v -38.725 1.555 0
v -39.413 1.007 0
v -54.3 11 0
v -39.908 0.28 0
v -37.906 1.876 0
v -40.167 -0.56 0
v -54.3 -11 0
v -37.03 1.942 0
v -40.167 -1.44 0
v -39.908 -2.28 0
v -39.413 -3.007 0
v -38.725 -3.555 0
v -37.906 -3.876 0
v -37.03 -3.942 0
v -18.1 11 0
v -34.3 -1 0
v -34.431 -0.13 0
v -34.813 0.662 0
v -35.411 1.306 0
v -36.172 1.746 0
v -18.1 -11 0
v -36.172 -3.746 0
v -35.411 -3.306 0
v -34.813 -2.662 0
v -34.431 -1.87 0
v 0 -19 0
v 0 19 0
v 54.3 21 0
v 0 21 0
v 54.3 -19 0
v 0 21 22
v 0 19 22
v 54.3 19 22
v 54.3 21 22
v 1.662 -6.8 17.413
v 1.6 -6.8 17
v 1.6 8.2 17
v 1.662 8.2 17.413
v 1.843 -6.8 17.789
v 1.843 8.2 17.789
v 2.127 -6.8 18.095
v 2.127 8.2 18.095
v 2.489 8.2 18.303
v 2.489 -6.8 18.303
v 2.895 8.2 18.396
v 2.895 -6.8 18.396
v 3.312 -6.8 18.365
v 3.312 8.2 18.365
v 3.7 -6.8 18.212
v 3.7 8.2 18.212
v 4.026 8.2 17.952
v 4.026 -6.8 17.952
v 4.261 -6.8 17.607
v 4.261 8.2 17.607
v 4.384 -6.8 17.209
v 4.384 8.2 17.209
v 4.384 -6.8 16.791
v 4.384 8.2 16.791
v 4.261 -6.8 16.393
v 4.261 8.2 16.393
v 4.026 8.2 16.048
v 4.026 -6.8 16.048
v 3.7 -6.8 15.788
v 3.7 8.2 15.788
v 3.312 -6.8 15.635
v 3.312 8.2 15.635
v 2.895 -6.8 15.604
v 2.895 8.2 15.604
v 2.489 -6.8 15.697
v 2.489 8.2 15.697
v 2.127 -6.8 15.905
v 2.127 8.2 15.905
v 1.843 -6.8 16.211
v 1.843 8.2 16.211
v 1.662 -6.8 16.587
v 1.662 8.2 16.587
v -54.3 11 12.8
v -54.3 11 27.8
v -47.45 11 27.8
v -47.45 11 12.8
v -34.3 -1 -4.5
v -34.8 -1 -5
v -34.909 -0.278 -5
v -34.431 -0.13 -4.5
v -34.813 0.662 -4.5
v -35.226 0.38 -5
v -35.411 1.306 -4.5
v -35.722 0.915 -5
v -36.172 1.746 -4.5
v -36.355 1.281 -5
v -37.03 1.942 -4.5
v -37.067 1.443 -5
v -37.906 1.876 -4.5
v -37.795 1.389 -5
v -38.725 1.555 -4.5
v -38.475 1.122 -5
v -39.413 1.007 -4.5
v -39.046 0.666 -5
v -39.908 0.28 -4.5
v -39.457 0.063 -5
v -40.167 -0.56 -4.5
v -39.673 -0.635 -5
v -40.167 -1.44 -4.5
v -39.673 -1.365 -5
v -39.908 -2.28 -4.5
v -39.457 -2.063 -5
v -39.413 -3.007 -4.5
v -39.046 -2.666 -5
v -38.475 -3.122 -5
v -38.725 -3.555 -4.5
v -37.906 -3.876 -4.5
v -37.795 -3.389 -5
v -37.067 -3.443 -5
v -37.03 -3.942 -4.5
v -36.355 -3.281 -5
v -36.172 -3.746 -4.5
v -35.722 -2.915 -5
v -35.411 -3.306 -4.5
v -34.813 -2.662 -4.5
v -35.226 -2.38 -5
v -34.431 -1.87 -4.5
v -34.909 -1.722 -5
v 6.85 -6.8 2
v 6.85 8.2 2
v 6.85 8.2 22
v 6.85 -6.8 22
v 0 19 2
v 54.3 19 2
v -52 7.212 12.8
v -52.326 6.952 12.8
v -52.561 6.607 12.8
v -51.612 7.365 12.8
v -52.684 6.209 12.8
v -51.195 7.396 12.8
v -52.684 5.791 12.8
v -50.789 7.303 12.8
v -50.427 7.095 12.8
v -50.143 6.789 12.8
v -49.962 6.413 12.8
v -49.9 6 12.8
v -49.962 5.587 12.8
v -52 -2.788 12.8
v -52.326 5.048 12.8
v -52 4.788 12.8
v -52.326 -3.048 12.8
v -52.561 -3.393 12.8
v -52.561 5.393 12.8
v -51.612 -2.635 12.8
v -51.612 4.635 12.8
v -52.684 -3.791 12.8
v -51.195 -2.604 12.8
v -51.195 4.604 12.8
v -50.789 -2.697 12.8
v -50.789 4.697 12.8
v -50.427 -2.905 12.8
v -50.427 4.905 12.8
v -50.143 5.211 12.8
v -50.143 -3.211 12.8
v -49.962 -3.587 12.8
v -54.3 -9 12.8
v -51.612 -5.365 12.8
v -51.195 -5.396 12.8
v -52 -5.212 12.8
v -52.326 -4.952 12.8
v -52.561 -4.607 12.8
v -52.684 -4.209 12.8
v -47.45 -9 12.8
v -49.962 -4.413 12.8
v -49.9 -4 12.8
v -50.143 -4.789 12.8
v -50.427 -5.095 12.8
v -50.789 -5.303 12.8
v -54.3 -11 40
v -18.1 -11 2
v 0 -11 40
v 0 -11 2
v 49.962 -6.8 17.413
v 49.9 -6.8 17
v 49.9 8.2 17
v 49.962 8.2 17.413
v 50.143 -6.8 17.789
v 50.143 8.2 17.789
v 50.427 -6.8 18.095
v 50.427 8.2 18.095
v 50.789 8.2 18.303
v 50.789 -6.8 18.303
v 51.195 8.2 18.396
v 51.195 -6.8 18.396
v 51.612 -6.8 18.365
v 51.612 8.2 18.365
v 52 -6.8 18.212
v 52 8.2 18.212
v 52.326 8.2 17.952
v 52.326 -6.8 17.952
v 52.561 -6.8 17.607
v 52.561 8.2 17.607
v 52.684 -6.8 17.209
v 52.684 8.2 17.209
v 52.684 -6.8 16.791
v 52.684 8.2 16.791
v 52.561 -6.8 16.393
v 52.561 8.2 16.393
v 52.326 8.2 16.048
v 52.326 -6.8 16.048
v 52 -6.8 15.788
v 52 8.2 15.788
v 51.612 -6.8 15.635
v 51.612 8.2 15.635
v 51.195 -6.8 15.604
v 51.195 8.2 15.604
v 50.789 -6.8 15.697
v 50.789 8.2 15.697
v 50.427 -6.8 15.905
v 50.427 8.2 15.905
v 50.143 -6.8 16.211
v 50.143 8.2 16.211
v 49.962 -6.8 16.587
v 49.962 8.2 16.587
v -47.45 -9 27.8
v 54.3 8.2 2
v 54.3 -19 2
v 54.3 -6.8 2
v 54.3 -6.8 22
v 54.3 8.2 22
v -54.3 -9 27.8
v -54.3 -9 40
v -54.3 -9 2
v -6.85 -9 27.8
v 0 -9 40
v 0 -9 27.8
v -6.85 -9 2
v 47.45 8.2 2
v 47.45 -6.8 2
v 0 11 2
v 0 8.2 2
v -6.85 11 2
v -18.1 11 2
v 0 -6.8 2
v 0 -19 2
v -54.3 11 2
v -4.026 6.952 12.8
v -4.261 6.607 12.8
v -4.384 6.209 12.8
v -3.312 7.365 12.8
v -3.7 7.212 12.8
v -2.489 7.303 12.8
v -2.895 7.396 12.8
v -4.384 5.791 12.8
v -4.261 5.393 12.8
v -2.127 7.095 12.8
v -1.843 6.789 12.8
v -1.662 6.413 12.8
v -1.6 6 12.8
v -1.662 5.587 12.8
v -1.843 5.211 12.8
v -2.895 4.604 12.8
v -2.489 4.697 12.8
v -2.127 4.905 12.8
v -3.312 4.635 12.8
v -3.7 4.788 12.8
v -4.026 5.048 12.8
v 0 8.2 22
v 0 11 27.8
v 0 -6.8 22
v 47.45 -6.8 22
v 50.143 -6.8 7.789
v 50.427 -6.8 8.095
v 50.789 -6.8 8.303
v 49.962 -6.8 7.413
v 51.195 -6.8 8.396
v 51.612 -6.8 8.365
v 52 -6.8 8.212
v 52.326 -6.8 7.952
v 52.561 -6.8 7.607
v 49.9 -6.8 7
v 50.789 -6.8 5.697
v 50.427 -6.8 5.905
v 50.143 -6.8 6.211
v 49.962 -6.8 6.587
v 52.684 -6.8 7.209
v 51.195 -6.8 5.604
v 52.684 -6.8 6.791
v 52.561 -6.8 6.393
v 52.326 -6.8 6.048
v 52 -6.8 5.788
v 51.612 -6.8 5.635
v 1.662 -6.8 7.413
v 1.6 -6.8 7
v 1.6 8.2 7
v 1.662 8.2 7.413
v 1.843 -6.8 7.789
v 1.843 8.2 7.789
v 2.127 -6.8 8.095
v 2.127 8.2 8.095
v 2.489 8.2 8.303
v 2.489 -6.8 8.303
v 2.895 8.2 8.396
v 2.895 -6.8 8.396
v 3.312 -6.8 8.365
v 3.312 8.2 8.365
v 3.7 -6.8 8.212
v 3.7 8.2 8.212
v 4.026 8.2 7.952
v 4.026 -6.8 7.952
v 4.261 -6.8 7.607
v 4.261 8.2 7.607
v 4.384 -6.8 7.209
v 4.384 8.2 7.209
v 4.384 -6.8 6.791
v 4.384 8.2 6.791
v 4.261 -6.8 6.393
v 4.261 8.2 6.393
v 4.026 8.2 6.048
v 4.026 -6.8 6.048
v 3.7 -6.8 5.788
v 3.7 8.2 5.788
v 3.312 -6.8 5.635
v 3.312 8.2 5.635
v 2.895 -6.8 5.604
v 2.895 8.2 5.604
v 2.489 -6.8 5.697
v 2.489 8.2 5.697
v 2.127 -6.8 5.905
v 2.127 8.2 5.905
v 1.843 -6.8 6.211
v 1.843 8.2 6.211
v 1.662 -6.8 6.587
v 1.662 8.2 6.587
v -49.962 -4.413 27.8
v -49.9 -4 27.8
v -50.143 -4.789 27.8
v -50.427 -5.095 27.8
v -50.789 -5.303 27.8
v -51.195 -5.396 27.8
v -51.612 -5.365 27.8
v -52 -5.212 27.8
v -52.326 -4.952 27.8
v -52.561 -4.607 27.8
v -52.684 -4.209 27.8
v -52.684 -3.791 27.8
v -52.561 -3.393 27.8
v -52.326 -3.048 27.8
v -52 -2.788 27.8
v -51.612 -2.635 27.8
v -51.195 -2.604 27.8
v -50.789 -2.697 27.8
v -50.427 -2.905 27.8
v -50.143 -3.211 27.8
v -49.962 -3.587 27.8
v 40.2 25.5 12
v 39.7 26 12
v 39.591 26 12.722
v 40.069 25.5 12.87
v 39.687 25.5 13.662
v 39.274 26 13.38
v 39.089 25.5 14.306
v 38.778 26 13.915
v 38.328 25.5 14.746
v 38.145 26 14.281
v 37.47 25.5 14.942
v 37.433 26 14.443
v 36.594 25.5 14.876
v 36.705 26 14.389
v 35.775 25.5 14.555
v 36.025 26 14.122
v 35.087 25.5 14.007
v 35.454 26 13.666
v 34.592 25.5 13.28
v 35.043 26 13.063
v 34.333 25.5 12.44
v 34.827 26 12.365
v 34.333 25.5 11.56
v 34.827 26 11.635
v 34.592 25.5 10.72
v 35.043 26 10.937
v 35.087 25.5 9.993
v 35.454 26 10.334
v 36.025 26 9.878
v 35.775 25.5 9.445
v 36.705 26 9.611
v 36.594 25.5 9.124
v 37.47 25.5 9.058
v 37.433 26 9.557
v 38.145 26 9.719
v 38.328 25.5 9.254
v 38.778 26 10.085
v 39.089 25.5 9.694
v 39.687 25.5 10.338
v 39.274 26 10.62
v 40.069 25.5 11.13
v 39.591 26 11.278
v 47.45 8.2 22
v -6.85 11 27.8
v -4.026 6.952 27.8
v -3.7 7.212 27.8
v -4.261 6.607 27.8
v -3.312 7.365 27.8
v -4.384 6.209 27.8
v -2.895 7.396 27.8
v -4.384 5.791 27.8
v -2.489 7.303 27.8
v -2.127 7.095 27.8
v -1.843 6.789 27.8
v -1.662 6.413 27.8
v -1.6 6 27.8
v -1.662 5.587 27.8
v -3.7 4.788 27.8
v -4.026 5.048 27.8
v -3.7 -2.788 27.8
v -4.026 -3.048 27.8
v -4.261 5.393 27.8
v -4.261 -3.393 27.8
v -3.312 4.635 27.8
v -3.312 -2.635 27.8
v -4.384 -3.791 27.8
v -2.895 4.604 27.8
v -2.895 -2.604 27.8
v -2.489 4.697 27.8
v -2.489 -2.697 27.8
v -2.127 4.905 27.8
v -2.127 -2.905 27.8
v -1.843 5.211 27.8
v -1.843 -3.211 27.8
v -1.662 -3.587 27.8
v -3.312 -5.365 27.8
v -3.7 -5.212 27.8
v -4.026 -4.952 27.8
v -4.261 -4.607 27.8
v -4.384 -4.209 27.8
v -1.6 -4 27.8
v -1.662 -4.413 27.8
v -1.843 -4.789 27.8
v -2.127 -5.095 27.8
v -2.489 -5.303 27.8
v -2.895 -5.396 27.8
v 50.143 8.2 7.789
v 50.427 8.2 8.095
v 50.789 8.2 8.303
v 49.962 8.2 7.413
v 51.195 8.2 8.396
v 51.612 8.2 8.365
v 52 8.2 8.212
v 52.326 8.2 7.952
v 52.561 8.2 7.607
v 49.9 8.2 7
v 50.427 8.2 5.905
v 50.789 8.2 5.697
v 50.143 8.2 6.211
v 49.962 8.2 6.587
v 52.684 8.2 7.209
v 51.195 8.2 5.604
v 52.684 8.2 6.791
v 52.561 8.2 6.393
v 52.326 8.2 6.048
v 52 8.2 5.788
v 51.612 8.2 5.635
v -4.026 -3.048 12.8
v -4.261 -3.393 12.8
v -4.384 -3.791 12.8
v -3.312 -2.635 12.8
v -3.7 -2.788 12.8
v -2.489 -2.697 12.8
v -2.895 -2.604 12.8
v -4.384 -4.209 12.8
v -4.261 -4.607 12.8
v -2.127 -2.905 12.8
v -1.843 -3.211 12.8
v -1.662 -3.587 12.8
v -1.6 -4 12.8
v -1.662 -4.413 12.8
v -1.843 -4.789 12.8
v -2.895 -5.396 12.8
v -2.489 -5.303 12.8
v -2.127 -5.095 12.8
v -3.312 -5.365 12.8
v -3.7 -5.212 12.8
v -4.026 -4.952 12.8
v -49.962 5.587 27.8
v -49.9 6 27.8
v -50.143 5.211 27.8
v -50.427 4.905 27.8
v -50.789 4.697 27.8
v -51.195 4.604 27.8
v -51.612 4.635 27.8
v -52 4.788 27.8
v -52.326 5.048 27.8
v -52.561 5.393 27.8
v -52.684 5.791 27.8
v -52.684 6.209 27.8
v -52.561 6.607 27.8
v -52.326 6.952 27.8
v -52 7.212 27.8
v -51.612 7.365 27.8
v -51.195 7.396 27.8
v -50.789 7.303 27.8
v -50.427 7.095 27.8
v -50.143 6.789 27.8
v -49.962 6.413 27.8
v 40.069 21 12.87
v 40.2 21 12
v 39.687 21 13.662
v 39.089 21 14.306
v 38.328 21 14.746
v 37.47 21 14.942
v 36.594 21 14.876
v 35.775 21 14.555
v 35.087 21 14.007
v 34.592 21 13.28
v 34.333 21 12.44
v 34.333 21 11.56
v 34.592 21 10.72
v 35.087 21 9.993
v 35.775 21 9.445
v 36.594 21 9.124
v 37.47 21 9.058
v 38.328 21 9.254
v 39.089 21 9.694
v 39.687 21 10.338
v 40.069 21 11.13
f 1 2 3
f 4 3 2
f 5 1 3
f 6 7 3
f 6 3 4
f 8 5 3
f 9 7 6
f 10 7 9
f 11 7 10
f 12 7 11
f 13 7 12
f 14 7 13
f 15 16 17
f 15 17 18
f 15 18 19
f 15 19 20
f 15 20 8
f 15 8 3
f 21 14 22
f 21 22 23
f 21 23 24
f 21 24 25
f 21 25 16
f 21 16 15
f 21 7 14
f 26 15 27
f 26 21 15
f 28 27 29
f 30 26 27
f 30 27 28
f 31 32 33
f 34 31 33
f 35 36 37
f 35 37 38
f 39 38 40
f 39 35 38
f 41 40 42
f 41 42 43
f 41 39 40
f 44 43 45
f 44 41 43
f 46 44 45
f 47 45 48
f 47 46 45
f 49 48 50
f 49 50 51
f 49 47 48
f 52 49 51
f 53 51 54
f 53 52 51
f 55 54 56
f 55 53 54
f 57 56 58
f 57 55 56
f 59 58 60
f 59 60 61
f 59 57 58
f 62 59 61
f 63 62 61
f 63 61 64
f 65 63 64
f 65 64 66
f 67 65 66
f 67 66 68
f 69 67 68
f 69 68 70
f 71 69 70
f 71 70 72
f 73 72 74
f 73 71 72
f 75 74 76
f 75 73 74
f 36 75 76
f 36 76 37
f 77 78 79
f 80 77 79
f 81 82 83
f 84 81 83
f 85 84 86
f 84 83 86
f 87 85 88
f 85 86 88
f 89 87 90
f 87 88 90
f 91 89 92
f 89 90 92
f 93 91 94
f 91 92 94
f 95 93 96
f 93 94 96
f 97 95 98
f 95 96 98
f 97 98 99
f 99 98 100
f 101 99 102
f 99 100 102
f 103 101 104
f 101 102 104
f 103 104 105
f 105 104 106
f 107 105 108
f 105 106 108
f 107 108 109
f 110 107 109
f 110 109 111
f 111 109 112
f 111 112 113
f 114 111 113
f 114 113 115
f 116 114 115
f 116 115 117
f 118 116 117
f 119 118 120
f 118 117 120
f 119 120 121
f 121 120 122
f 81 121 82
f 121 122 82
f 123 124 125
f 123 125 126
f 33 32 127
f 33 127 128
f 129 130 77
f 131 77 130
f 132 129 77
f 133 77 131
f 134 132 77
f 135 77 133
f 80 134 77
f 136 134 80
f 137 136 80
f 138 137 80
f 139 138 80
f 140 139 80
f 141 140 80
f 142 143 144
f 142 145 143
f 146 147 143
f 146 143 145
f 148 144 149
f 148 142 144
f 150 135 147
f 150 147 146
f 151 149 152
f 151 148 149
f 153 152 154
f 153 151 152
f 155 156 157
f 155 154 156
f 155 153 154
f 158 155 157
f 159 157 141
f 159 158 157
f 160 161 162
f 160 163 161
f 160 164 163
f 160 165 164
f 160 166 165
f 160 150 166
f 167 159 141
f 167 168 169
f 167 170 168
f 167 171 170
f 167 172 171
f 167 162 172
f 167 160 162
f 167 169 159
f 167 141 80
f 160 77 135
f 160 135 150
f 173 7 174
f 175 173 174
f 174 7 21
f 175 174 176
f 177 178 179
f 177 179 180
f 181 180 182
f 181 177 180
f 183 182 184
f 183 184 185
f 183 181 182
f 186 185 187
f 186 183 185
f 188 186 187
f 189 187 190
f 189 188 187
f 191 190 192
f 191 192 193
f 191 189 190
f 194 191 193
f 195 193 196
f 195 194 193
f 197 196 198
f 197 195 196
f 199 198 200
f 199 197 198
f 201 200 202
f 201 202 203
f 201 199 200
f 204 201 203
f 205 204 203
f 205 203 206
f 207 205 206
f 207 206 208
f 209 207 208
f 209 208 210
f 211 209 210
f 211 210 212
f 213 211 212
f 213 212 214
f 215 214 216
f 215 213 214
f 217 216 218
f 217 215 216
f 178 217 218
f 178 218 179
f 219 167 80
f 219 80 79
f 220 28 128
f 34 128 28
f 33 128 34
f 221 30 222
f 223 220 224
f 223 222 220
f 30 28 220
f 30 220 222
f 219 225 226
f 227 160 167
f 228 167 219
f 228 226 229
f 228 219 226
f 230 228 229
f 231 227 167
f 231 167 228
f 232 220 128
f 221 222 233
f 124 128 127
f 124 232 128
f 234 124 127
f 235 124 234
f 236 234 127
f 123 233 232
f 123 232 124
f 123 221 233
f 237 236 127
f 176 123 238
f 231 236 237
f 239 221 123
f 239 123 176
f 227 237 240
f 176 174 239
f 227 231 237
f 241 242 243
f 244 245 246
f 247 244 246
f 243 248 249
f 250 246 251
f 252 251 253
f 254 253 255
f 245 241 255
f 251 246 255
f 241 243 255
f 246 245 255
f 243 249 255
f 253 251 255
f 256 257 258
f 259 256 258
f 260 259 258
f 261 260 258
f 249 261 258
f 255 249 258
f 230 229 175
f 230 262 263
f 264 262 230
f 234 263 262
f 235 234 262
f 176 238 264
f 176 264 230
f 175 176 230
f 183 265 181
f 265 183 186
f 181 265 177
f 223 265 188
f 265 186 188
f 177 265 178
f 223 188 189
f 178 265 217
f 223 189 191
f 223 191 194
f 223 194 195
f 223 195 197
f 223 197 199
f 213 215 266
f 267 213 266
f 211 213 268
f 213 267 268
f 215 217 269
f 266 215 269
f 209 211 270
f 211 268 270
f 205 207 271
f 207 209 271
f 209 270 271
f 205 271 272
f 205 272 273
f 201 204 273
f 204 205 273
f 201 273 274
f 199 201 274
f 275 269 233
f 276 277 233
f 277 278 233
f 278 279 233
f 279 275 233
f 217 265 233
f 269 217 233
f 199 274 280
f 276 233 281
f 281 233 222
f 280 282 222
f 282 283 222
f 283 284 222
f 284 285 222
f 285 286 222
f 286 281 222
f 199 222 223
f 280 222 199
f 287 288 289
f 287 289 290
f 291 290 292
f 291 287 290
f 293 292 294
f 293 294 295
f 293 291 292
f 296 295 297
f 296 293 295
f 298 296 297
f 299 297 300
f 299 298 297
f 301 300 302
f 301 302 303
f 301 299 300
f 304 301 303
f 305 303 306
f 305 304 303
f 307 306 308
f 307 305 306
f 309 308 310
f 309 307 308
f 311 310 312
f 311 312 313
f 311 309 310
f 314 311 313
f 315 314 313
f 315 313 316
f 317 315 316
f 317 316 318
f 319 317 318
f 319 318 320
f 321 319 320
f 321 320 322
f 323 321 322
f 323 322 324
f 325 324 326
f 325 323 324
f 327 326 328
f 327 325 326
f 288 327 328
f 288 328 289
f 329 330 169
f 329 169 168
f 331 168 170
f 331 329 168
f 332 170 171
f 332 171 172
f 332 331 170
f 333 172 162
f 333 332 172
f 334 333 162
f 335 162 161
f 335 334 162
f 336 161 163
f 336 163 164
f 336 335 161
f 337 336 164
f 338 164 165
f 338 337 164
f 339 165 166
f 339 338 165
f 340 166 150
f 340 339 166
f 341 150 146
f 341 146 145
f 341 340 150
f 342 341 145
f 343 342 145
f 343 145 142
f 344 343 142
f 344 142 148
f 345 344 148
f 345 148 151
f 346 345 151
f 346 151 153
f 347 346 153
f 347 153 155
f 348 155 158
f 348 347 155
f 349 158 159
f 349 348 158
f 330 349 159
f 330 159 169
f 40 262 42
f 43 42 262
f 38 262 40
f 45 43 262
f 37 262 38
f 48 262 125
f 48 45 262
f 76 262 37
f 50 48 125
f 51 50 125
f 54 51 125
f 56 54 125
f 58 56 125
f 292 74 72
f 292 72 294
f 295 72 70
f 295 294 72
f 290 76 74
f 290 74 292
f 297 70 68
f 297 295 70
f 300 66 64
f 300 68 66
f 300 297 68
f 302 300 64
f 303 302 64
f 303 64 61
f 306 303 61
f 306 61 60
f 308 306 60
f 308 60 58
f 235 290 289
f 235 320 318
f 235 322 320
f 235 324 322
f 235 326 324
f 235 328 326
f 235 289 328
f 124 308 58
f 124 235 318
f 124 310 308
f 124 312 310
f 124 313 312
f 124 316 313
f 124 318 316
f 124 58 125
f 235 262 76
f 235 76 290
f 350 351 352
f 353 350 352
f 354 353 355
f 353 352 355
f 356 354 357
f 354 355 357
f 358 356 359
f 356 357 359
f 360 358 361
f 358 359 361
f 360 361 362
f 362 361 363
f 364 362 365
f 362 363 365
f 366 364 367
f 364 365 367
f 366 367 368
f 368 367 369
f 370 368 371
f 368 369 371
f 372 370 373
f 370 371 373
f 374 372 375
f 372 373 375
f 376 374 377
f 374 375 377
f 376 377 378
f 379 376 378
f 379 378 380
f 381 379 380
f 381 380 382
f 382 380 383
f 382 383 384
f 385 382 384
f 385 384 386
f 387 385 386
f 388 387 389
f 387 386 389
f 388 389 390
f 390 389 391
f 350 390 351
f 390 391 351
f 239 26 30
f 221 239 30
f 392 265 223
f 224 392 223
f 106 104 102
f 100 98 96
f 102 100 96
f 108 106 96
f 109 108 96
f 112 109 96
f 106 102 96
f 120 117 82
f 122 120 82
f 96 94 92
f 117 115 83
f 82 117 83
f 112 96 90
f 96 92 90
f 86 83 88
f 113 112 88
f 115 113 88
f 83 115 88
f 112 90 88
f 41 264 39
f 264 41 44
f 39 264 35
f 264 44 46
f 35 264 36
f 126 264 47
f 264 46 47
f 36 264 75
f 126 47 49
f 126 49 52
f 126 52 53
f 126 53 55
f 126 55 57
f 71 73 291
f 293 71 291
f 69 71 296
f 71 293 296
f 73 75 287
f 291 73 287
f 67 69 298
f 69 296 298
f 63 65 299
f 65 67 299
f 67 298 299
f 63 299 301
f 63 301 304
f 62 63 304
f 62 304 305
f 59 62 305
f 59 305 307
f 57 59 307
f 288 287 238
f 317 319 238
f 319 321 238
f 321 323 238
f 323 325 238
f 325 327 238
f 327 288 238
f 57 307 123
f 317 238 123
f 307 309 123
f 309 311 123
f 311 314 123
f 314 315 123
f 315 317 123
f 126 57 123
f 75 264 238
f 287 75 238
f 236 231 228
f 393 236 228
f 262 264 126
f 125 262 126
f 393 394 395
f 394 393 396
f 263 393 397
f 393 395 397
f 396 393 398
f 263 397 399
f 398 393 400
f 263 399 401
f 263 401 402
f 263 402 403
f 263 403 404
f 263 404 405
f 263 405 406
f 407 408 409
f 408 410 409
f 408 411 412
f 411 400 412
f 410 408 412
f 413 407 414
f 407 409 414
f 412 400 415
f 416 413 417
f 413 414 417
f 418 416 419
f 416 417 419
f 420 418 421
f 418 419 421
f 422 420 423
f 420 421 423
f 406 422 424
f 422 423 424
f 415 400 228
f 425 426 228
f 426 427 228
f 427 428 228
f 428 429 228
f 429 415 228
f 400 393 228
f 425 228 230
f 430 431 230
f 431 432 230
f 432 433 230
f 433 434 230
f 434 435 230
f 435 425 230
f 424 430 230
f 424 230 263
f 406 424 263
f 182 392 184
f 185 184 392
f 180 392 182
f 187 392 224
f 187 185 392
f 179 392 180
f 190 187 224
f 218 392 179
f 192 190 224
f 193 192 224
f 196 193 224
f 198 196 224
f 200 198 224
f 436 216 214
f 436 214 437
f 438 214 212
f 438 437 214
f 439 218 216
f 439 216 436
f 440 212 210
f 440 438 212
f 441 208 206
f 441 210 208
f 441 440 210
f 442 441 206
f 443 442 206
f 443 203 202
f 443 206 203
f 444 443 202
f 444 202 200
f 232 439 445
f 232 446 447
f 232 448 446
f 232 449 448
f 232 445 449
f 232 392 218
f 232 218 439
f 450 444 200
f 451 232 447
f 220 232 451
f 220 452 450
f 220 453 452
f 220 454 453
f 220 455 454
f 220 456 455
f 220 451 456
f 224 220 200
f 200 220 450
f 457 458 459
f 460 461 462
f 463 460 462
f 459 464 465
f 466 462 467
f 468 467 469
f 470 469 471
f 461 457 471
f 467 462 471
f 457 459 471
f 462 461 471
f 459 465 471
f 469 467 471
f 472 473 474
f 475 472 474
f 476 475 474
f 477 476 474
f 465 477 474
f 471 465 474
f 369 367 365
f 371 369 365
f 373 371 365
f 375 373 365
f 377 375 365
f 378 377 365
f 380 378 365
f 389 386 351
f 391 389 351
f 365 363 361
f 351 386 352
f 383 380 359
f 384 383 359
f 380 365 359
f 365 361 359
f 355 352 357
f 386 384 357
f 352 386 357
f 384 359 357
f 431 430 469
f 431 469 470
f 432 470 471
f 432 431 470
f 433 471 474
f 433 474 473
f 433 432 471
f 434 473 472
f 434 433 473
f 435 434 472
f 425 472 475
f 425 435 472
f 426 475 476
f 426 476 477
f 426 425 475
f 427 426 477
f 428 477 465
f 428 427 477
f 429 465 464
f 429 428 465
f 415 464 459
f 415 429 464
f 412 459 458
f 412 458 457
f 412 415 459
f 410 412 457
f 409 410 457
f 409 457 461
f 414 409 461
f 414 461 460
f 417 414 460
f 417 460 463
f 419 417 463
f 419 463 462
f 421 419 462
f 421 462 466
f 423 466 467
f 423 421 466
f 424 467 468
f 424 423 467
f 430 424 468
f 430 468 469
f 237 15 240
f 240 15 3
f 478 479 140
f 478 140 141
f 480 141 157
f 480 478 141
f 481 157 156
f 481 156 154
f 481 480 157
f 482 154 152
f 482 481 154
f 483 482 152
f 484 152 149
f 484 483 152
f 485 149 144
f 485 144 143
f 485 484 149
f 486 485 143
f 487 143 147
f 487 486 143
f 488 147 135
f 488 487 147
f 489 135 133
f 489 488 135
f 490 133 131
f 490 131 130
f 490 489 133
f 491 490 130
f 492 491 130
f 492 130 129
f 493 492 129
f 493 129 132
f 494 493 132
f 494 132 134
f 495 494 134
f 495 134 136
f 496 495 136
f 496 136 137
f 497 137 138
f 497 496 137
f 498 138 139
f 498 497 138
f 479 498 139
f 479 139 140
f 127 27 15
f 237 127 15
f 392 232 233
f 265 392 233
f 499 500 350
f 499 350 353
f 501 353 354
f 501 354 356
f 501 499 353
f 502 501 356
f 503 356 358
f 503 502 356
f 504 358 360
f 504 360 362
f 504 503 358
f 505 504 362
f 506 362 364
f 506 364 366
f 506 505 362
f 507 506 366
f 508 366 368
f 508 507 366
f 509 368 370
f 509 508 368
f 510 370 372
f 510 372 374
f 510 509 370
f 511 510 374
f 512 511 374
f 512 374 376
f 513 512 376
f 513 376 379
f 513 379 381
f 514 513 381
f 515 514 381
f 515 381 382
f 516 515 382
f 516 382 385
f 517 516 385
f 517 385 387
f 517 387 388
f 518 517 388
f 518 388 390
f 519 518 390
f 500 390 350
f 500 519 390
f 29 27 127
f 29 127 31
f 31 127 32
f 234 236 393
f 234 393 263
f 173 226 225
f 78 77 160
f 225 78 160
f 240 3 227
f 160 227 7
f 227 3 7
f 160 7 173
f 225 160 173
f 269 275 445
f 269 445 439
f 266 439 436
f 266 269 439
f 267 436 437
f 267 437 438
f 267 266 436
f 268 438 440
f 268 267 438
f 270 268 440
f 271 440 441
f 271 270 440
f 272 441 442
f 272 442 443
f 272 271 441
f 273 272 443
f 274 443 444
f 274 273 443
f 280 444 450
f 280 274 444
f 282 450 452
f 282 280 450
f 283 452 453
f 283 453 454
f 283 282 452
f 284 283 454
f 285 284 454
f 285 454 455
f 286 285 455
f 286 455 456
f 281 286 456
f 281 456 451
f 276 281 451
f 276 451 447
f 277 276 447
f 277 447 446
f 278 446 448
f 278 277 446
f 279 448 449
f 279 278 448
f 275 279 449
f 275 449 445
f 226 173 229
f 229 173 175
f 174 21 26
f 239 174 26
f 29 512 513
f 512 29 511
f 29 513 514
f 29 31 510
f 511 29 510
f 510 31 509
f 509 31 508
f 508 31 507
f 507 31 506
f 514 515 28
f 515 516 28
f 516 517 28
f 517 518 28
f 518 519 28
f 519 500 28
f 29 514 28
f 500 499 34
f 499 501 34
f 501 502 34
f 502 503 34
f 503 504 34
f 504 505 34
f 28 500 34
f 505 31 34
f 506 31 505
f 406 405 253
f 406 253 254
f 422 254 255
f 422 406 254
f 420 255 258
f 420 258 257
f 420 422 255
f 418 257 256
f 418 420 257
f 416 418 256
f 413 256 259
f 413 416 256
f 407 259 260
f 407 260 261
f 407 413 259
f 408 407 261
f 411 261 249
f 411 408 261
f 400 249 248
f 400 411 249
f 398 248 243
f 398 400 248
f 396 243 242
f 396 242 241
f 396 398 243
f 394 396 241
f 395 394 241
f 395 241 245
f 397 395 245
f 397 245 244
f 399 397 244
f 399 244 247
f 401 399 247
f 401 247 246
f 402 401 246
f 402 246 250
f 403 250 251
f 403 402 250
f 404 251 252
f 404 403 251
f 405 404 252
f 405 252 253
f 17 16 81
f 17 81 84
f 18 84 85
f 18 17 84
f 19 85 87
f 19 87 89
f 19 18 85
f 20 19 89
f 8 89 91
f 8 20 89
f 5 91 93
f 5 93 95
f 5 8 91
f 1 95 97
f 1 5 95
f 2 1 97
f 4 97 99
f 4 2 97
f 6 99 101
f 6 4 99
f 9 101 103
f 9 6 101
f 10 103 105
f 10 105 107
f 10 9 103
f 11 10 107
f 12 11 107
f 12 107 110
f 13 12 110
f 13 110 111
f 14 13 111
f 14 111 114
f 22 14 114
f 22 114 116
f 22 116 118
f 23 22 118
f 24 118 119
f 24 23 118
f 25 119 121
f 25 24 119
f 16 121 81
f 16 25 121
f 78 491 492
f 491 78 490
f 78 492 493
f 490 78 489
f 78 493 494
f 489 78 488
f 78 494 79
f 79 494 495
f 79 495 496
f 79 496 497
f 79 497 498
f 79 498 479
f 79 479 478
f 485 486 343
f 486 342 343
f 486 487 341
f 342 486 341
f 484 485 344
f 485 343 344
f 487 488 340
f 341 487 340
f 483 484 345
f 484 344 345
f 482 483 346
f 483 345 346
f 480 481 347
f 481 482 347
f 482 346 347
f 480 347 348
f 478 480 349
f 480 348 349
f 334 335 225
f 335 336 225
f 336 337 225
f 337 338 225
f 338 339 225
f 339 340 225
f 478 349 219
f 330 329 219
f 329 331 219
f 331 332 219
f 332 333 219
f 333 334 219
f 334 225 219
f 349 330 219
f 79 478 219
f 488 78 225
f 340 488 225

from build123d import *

# Parameters (mm, degrees)
PAD_DEPTH       = 2
SKETCH002_W     = 54.3
SKETCH002_H     = 22
PAD001_DEPTH    = 2
SKETCH003_R     = 2.95
PAD002_DEPTH    = 5
CHAMFER_SIZE    = 0.5
SKETCH004_W     = 6.85
SKETCH004_H     = 15
PAD003_DEPTH    = 20
SKETCH005_R     = 1.4
POCKET_DEPTH    = 15
SKETCH006_W     = 6.85
SKETCH006_H     = 15
PAD004_DEPTH    = 20
SKETCH007_R     = 1.4
POCKET001_DEPTH = 15
SKETCH008_W     = 54.3
SKETCH008_H     = 2
PAD005_DEPTH    = 38
SKETCH009_W     = 6.85
SKETCH009_H     = 15
PAD006_DEPTH    = 20
SKETCH010_R     = 1.4
POCKET002_DEPTH = 15
SKETCH011_W     = 6.85
SKETCH011_H     = 25.8
PAD007_DEPTH    = 20
SKETCH012_R     = 1.4
POCKET003_DEPTH = 15
SKETCH013_R     = 2.95
PAD008_DEPTH    = 5
CHAMFER001_SIZE = 0.5


with BuildPart() as body:
    # Sketch → Pad (new body)
    with BuildSketch(Plane.XY):
        Polygon((54.3, 19), (54.3, -19), (0, -19), (-18.1, -11), (-54.3, -11), (-54.3, 11), (-18.1, 11), (0, 19), align=None)
    extrude(amount=PAD_DEPTH)

    # Sketch002 (on Face2 of Pad) → Pad001 (join)
    with BuildSketch(Plane.XZ.offset(19)):
        with Locations((27.15, 11)):
            Rectangle(SKETCH002_W, SKETCH002_H)
    extrude(amount=PAD001_DEPTH)

    # Sketch003 (on Face10 of Pad001) → Pad002 (join)
    with BuildSketch(Plane.XZ.offset(21)):
        with Locations((37.25, 12)):
            Circle(SKETCH003_R)
    extrude(amount=PAD002_DEPTH)

    # Chamfer
    chamfer_edges = [body.edges().sort_by_distance(p)[0] for p in [
        (34.3, -26, 12),
    ]]
    chamfer(chamfer_edges, length=CHAMFER_SIZE)

    # Sketch004 (on Face18 of Chamfer) → Pad003 (join)
    with BuildSketch(Plane.XY.offset(2)):
        with Locations((3.425, -0.7)):
            Rectangle(SKETCH004_W, SKETCH004_H)
    extrude(amount=PAD003_DEPTH)

    # Sketch005 (on Face22 of Pad003) → Pocket (cut)
    with BuildSketch(Plane(origin=(0, 6.8, 0), x_dir=(-1, 0, 0), z_dir=(0, 1, 0))):
        with Locations((-3, 17)):
            Circle(SKETCH005_R)
        with Locations((-3, 7)):
            Circle(SKETCH005_R)
    extrude(amount=-POCKET_DEPTH, mode=Mode.SUBTRACT)

    # Sketch006 (on Face18 of Pocket) → Pad004 (join)
    with BuildSketch(Plane.XY.offset(2)):
        with Locations((50.875, -0.7)):
            Rectangle(SKETCH006_W, SKETCH006_H)
    extrude(amount=PAD004_DEPTH)

    # Sketch007 (on Face20 of Pad004) → Pocket001 (cut)
    with BuildSketch(Plane(origin=(0, 6.8, 0), x_dir=(-1, 0, 0), z_dir=(0, 1, 0))):
        with Locations((-51.3, 17)):
            Circle(SKETCH007_R)
        with Locations((-51.3, 7)):
            Circle(SKETCH007_R)
    extrude(amount=-POCKET001_DEPTH, mode=Mode.SUBTRACT)

    # Sketch008 (on Face18 of Pocket001) → Pad005 (join)
    with BuildSketch(Plane.XY.offset(2)):
        with Locations((-27.15, 10)):
            Rectangle(SKETCH008_W, SKETCH008_H)
    extrude(amount=PAD005_DEPTH)

    # Sketch009 (on Face25 of Pad005) → Pad006 (join)
    with BuildSketch(Plane.XZ.offset(-9)):
        with Locations((-50.875, 20.3)):
            Rectangle(SKETCH009_W, SKETCH009_H)
    extrude(amount=PAD006_DEPTH)

    # Sketch010 (on Face38 of Pad006) → Pocket002 (cut)
    with BuildSketch(Plane.XY.offset(27.8)):
        with Locations((-51.3, -6)):
            Circle(SKETCH010_R)
        with Locations((-51.3, 4)):
            Circle(SKETCH010_R)
    extrude(amount=-POCKET002_DEPTH, mode=Mode.SUBTRACT)

    # Sketch011 (on Face25 of Pocket002) → Pad007 (join)
    with BuildSketch(Plane.XZ.offset(-9)):
        with Locations((-3.425, 14.9)):
            Rectangle(SKETCH011_W, SKETCH011_H)
    extrude(amount=PAD007_DEPTH)

    # Sketch012 (on Face41 of Pad007) → Pocket003 (cut)
    with BuildSketch(Plane.XY.offset(27.8)):
        with Locations((-3, -6)):
            Circle(SKETCH012_R)
        with Locations((-3, 4)):
            Circle(SKETCH012_R)
    extrude(amount=-POCKET003_DEPTH, mode=Mode.SUBTRACT)

    # Sketch013 (on Face9 of Pocket003) → Pad008 (join)
    with BuildSketch(Plane(origin=(0, 0, 0), x_dir=(1, 0, 0), z_dir=(0, 0, -1))):
        with Locations((-37.25, -1)):
            Circle(SKETCH013_R)
    extrude(amount=PAD008_DEPTH)

    # Chamfer001
    chamfer001_edges = [body.edges().sort_by_distance(p)[0] for p in [
        (-40.2, 1, -5),
    ]]
    chamfer(chamfer001_edges, length=CHAMFER001_SIZE)


with BuildPart() as part_mirroring:
    # Part__Mirroring: instance of Body
    add(body.part.mirror(Plane(origin=(0, 0, 0), x_dir=(1, 0, 0), z_dir=(0, 1, 0))))


solid = part_mirroring.part
